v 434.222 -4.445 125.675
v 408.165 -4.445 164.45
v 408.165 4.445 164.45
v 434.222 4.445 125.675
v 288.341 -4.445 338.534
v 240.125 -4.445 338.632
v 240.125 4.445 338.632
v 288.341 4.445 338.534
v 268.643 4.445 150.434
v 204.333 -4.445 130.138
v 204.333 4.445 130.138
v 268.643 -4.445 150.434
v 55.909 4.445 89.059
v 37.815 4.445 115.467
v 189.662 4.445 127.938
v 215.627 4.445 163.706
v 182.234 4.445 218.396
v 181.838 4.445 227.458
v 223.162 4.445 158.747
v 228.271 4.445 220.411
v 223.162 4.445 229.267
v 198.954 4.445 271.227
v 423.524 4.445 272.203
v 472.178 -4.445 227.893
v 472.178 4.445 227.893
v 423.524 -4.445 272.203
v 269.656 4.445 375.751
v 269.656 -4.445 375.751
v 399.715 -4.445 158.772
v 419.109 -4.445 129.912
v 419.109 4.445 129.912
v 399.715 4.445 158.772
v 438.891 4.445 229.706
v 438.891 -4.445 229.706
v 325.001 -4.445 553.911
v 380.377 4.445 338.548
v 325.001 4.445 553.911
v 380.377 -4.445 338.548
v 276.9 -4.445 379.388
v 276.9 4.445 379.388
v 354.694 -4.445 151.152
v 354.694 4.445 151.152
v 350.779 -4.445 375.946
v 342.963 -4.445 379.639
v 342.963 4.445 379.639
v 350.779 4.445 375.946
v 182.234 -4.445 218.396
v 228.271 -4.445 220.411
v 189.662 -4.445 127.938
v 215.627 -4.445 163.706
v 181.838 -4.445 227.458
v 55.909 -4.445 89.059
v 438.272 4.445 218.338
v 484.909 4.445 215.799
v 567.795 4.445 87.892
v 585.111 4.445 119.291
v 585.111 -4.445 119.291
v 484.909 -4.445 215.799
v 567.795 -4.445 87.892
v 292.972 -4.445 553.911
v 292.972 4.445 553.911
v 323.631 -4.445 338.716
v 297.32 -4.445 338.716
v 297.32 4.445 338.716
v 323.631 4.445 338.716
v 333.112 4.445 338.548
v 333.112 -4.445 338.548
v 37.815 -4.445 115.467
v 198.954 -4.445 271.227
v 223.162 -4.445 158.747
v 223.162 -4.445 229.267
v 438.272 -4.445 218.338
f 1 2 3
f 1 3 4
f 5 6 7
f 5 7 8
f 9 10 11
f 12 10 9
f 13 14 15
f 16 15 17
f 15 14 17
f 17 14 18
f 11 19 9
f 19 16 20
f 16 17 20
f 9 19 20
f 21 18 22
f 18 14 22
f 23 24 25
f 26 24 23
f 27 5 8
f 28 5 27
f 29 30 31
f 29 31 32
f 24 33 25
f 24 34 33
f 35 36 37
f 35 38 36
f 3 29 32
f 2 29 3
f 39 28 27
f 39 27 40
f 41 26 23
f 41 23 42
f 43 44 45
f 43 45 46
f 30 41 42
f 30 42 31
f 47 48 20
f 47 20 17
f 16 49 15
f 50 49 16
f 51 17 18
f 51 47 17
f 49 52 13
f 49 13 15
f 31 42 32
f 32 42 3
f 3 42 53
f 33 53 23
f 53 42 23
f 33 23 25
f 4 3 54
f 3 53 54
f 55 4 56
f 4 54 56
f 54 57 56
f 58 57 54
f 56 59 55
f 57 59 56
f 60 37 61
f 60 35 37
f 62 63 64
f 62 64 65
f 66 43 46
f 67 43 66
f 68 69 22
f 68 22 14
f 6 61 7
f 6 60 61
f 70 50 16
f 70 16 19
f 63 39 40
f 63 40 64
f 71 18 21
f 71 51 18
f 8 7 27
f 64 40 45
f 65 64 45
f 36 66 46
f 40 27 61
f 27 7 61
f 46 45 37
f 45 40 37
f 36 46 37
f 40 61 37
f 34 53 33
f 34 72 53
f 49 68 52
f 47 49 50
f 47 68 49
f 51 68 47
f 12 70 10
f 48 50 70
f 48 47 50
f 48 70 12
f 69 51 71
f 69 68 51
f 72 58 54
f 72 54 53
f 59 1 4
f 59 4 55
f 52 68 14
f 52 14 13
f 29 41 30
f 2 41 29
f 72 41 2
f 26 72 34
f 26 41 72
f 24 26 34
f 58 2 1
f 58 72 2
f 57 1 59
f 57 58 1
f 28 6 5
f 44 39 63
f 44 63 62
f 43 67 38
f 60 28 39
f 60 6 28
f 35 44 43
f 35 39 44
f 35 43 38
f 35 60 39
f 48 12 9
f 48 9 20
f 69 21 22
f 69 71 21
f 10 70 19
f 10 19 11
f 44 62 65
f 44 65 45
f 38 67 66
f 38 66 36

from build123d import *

# Parameters (mm, degrees)
F1_DEPTH = 4.445
F3_DEPTH = 4.445
F5_DEPTH = 4.445


with BuildPart() as f1:
    # F0 (on Front) → F1 (new body, symmetric)
    with BuildSketch(Plane.XZ):
        Polygon((223.161593, 229.267116), (198.954016, 271.226913), (37.814662, 115.467012), (55.90922, 89.058749), (189.662218, 127.937585), (215.626555, 163.706194), (223.161593, 158.747241), (204.333484, 130.138278), (268.642515, 150.433525), (228.270639, 220.411437), (182.234346, 218.395627), (181.837544, 227.457643), align=None)
    extrude(amount=F1_DEPTH, both=True)


with BuildPart() as f3:
    # F2 (on Front) → F3 (new body, symmetric)
    with BuildSketch(Plane.XZ):
        Polygon((472.178144, 227.892929), (423.524201, 272.203356), (354.693711, 151.152492), (419.108897, 129.911646), (399.715066, 158.7715), (408.165246, 164.450024), (434.221779, 125.67544), (567.794859, 87.89169), (585.110784, 119.291216), (484.909356, 215.798572), (438.27185, 218.338236), (438.890865, 229.705602), align=None)
    extrude(amount=F3_DEPTH, both=True)


with BuildPart() as f5:
    # F4 (on Front) → F5 (new body, symmetric)
    with BuildSketch(Plane.XZ):
        Polygon((292.972475, 553.911328), (240.125, 338.632256), (288.341178, 338.534324), (269.655789, 375.750796), (276.899695, 379.387766), (297.31974, 338.716307), (323.631405, 338.716307), (342.962737, 379.638507), (350.778937, 375.946194), (333.11218, 338.547707), (380.376518, 338.547707), (325.00124, 553.911328), align=None)
    extrude(amount=F5_DEPTH, both=True)


solid = Compound([f1.part, f3.part, f5.part])
